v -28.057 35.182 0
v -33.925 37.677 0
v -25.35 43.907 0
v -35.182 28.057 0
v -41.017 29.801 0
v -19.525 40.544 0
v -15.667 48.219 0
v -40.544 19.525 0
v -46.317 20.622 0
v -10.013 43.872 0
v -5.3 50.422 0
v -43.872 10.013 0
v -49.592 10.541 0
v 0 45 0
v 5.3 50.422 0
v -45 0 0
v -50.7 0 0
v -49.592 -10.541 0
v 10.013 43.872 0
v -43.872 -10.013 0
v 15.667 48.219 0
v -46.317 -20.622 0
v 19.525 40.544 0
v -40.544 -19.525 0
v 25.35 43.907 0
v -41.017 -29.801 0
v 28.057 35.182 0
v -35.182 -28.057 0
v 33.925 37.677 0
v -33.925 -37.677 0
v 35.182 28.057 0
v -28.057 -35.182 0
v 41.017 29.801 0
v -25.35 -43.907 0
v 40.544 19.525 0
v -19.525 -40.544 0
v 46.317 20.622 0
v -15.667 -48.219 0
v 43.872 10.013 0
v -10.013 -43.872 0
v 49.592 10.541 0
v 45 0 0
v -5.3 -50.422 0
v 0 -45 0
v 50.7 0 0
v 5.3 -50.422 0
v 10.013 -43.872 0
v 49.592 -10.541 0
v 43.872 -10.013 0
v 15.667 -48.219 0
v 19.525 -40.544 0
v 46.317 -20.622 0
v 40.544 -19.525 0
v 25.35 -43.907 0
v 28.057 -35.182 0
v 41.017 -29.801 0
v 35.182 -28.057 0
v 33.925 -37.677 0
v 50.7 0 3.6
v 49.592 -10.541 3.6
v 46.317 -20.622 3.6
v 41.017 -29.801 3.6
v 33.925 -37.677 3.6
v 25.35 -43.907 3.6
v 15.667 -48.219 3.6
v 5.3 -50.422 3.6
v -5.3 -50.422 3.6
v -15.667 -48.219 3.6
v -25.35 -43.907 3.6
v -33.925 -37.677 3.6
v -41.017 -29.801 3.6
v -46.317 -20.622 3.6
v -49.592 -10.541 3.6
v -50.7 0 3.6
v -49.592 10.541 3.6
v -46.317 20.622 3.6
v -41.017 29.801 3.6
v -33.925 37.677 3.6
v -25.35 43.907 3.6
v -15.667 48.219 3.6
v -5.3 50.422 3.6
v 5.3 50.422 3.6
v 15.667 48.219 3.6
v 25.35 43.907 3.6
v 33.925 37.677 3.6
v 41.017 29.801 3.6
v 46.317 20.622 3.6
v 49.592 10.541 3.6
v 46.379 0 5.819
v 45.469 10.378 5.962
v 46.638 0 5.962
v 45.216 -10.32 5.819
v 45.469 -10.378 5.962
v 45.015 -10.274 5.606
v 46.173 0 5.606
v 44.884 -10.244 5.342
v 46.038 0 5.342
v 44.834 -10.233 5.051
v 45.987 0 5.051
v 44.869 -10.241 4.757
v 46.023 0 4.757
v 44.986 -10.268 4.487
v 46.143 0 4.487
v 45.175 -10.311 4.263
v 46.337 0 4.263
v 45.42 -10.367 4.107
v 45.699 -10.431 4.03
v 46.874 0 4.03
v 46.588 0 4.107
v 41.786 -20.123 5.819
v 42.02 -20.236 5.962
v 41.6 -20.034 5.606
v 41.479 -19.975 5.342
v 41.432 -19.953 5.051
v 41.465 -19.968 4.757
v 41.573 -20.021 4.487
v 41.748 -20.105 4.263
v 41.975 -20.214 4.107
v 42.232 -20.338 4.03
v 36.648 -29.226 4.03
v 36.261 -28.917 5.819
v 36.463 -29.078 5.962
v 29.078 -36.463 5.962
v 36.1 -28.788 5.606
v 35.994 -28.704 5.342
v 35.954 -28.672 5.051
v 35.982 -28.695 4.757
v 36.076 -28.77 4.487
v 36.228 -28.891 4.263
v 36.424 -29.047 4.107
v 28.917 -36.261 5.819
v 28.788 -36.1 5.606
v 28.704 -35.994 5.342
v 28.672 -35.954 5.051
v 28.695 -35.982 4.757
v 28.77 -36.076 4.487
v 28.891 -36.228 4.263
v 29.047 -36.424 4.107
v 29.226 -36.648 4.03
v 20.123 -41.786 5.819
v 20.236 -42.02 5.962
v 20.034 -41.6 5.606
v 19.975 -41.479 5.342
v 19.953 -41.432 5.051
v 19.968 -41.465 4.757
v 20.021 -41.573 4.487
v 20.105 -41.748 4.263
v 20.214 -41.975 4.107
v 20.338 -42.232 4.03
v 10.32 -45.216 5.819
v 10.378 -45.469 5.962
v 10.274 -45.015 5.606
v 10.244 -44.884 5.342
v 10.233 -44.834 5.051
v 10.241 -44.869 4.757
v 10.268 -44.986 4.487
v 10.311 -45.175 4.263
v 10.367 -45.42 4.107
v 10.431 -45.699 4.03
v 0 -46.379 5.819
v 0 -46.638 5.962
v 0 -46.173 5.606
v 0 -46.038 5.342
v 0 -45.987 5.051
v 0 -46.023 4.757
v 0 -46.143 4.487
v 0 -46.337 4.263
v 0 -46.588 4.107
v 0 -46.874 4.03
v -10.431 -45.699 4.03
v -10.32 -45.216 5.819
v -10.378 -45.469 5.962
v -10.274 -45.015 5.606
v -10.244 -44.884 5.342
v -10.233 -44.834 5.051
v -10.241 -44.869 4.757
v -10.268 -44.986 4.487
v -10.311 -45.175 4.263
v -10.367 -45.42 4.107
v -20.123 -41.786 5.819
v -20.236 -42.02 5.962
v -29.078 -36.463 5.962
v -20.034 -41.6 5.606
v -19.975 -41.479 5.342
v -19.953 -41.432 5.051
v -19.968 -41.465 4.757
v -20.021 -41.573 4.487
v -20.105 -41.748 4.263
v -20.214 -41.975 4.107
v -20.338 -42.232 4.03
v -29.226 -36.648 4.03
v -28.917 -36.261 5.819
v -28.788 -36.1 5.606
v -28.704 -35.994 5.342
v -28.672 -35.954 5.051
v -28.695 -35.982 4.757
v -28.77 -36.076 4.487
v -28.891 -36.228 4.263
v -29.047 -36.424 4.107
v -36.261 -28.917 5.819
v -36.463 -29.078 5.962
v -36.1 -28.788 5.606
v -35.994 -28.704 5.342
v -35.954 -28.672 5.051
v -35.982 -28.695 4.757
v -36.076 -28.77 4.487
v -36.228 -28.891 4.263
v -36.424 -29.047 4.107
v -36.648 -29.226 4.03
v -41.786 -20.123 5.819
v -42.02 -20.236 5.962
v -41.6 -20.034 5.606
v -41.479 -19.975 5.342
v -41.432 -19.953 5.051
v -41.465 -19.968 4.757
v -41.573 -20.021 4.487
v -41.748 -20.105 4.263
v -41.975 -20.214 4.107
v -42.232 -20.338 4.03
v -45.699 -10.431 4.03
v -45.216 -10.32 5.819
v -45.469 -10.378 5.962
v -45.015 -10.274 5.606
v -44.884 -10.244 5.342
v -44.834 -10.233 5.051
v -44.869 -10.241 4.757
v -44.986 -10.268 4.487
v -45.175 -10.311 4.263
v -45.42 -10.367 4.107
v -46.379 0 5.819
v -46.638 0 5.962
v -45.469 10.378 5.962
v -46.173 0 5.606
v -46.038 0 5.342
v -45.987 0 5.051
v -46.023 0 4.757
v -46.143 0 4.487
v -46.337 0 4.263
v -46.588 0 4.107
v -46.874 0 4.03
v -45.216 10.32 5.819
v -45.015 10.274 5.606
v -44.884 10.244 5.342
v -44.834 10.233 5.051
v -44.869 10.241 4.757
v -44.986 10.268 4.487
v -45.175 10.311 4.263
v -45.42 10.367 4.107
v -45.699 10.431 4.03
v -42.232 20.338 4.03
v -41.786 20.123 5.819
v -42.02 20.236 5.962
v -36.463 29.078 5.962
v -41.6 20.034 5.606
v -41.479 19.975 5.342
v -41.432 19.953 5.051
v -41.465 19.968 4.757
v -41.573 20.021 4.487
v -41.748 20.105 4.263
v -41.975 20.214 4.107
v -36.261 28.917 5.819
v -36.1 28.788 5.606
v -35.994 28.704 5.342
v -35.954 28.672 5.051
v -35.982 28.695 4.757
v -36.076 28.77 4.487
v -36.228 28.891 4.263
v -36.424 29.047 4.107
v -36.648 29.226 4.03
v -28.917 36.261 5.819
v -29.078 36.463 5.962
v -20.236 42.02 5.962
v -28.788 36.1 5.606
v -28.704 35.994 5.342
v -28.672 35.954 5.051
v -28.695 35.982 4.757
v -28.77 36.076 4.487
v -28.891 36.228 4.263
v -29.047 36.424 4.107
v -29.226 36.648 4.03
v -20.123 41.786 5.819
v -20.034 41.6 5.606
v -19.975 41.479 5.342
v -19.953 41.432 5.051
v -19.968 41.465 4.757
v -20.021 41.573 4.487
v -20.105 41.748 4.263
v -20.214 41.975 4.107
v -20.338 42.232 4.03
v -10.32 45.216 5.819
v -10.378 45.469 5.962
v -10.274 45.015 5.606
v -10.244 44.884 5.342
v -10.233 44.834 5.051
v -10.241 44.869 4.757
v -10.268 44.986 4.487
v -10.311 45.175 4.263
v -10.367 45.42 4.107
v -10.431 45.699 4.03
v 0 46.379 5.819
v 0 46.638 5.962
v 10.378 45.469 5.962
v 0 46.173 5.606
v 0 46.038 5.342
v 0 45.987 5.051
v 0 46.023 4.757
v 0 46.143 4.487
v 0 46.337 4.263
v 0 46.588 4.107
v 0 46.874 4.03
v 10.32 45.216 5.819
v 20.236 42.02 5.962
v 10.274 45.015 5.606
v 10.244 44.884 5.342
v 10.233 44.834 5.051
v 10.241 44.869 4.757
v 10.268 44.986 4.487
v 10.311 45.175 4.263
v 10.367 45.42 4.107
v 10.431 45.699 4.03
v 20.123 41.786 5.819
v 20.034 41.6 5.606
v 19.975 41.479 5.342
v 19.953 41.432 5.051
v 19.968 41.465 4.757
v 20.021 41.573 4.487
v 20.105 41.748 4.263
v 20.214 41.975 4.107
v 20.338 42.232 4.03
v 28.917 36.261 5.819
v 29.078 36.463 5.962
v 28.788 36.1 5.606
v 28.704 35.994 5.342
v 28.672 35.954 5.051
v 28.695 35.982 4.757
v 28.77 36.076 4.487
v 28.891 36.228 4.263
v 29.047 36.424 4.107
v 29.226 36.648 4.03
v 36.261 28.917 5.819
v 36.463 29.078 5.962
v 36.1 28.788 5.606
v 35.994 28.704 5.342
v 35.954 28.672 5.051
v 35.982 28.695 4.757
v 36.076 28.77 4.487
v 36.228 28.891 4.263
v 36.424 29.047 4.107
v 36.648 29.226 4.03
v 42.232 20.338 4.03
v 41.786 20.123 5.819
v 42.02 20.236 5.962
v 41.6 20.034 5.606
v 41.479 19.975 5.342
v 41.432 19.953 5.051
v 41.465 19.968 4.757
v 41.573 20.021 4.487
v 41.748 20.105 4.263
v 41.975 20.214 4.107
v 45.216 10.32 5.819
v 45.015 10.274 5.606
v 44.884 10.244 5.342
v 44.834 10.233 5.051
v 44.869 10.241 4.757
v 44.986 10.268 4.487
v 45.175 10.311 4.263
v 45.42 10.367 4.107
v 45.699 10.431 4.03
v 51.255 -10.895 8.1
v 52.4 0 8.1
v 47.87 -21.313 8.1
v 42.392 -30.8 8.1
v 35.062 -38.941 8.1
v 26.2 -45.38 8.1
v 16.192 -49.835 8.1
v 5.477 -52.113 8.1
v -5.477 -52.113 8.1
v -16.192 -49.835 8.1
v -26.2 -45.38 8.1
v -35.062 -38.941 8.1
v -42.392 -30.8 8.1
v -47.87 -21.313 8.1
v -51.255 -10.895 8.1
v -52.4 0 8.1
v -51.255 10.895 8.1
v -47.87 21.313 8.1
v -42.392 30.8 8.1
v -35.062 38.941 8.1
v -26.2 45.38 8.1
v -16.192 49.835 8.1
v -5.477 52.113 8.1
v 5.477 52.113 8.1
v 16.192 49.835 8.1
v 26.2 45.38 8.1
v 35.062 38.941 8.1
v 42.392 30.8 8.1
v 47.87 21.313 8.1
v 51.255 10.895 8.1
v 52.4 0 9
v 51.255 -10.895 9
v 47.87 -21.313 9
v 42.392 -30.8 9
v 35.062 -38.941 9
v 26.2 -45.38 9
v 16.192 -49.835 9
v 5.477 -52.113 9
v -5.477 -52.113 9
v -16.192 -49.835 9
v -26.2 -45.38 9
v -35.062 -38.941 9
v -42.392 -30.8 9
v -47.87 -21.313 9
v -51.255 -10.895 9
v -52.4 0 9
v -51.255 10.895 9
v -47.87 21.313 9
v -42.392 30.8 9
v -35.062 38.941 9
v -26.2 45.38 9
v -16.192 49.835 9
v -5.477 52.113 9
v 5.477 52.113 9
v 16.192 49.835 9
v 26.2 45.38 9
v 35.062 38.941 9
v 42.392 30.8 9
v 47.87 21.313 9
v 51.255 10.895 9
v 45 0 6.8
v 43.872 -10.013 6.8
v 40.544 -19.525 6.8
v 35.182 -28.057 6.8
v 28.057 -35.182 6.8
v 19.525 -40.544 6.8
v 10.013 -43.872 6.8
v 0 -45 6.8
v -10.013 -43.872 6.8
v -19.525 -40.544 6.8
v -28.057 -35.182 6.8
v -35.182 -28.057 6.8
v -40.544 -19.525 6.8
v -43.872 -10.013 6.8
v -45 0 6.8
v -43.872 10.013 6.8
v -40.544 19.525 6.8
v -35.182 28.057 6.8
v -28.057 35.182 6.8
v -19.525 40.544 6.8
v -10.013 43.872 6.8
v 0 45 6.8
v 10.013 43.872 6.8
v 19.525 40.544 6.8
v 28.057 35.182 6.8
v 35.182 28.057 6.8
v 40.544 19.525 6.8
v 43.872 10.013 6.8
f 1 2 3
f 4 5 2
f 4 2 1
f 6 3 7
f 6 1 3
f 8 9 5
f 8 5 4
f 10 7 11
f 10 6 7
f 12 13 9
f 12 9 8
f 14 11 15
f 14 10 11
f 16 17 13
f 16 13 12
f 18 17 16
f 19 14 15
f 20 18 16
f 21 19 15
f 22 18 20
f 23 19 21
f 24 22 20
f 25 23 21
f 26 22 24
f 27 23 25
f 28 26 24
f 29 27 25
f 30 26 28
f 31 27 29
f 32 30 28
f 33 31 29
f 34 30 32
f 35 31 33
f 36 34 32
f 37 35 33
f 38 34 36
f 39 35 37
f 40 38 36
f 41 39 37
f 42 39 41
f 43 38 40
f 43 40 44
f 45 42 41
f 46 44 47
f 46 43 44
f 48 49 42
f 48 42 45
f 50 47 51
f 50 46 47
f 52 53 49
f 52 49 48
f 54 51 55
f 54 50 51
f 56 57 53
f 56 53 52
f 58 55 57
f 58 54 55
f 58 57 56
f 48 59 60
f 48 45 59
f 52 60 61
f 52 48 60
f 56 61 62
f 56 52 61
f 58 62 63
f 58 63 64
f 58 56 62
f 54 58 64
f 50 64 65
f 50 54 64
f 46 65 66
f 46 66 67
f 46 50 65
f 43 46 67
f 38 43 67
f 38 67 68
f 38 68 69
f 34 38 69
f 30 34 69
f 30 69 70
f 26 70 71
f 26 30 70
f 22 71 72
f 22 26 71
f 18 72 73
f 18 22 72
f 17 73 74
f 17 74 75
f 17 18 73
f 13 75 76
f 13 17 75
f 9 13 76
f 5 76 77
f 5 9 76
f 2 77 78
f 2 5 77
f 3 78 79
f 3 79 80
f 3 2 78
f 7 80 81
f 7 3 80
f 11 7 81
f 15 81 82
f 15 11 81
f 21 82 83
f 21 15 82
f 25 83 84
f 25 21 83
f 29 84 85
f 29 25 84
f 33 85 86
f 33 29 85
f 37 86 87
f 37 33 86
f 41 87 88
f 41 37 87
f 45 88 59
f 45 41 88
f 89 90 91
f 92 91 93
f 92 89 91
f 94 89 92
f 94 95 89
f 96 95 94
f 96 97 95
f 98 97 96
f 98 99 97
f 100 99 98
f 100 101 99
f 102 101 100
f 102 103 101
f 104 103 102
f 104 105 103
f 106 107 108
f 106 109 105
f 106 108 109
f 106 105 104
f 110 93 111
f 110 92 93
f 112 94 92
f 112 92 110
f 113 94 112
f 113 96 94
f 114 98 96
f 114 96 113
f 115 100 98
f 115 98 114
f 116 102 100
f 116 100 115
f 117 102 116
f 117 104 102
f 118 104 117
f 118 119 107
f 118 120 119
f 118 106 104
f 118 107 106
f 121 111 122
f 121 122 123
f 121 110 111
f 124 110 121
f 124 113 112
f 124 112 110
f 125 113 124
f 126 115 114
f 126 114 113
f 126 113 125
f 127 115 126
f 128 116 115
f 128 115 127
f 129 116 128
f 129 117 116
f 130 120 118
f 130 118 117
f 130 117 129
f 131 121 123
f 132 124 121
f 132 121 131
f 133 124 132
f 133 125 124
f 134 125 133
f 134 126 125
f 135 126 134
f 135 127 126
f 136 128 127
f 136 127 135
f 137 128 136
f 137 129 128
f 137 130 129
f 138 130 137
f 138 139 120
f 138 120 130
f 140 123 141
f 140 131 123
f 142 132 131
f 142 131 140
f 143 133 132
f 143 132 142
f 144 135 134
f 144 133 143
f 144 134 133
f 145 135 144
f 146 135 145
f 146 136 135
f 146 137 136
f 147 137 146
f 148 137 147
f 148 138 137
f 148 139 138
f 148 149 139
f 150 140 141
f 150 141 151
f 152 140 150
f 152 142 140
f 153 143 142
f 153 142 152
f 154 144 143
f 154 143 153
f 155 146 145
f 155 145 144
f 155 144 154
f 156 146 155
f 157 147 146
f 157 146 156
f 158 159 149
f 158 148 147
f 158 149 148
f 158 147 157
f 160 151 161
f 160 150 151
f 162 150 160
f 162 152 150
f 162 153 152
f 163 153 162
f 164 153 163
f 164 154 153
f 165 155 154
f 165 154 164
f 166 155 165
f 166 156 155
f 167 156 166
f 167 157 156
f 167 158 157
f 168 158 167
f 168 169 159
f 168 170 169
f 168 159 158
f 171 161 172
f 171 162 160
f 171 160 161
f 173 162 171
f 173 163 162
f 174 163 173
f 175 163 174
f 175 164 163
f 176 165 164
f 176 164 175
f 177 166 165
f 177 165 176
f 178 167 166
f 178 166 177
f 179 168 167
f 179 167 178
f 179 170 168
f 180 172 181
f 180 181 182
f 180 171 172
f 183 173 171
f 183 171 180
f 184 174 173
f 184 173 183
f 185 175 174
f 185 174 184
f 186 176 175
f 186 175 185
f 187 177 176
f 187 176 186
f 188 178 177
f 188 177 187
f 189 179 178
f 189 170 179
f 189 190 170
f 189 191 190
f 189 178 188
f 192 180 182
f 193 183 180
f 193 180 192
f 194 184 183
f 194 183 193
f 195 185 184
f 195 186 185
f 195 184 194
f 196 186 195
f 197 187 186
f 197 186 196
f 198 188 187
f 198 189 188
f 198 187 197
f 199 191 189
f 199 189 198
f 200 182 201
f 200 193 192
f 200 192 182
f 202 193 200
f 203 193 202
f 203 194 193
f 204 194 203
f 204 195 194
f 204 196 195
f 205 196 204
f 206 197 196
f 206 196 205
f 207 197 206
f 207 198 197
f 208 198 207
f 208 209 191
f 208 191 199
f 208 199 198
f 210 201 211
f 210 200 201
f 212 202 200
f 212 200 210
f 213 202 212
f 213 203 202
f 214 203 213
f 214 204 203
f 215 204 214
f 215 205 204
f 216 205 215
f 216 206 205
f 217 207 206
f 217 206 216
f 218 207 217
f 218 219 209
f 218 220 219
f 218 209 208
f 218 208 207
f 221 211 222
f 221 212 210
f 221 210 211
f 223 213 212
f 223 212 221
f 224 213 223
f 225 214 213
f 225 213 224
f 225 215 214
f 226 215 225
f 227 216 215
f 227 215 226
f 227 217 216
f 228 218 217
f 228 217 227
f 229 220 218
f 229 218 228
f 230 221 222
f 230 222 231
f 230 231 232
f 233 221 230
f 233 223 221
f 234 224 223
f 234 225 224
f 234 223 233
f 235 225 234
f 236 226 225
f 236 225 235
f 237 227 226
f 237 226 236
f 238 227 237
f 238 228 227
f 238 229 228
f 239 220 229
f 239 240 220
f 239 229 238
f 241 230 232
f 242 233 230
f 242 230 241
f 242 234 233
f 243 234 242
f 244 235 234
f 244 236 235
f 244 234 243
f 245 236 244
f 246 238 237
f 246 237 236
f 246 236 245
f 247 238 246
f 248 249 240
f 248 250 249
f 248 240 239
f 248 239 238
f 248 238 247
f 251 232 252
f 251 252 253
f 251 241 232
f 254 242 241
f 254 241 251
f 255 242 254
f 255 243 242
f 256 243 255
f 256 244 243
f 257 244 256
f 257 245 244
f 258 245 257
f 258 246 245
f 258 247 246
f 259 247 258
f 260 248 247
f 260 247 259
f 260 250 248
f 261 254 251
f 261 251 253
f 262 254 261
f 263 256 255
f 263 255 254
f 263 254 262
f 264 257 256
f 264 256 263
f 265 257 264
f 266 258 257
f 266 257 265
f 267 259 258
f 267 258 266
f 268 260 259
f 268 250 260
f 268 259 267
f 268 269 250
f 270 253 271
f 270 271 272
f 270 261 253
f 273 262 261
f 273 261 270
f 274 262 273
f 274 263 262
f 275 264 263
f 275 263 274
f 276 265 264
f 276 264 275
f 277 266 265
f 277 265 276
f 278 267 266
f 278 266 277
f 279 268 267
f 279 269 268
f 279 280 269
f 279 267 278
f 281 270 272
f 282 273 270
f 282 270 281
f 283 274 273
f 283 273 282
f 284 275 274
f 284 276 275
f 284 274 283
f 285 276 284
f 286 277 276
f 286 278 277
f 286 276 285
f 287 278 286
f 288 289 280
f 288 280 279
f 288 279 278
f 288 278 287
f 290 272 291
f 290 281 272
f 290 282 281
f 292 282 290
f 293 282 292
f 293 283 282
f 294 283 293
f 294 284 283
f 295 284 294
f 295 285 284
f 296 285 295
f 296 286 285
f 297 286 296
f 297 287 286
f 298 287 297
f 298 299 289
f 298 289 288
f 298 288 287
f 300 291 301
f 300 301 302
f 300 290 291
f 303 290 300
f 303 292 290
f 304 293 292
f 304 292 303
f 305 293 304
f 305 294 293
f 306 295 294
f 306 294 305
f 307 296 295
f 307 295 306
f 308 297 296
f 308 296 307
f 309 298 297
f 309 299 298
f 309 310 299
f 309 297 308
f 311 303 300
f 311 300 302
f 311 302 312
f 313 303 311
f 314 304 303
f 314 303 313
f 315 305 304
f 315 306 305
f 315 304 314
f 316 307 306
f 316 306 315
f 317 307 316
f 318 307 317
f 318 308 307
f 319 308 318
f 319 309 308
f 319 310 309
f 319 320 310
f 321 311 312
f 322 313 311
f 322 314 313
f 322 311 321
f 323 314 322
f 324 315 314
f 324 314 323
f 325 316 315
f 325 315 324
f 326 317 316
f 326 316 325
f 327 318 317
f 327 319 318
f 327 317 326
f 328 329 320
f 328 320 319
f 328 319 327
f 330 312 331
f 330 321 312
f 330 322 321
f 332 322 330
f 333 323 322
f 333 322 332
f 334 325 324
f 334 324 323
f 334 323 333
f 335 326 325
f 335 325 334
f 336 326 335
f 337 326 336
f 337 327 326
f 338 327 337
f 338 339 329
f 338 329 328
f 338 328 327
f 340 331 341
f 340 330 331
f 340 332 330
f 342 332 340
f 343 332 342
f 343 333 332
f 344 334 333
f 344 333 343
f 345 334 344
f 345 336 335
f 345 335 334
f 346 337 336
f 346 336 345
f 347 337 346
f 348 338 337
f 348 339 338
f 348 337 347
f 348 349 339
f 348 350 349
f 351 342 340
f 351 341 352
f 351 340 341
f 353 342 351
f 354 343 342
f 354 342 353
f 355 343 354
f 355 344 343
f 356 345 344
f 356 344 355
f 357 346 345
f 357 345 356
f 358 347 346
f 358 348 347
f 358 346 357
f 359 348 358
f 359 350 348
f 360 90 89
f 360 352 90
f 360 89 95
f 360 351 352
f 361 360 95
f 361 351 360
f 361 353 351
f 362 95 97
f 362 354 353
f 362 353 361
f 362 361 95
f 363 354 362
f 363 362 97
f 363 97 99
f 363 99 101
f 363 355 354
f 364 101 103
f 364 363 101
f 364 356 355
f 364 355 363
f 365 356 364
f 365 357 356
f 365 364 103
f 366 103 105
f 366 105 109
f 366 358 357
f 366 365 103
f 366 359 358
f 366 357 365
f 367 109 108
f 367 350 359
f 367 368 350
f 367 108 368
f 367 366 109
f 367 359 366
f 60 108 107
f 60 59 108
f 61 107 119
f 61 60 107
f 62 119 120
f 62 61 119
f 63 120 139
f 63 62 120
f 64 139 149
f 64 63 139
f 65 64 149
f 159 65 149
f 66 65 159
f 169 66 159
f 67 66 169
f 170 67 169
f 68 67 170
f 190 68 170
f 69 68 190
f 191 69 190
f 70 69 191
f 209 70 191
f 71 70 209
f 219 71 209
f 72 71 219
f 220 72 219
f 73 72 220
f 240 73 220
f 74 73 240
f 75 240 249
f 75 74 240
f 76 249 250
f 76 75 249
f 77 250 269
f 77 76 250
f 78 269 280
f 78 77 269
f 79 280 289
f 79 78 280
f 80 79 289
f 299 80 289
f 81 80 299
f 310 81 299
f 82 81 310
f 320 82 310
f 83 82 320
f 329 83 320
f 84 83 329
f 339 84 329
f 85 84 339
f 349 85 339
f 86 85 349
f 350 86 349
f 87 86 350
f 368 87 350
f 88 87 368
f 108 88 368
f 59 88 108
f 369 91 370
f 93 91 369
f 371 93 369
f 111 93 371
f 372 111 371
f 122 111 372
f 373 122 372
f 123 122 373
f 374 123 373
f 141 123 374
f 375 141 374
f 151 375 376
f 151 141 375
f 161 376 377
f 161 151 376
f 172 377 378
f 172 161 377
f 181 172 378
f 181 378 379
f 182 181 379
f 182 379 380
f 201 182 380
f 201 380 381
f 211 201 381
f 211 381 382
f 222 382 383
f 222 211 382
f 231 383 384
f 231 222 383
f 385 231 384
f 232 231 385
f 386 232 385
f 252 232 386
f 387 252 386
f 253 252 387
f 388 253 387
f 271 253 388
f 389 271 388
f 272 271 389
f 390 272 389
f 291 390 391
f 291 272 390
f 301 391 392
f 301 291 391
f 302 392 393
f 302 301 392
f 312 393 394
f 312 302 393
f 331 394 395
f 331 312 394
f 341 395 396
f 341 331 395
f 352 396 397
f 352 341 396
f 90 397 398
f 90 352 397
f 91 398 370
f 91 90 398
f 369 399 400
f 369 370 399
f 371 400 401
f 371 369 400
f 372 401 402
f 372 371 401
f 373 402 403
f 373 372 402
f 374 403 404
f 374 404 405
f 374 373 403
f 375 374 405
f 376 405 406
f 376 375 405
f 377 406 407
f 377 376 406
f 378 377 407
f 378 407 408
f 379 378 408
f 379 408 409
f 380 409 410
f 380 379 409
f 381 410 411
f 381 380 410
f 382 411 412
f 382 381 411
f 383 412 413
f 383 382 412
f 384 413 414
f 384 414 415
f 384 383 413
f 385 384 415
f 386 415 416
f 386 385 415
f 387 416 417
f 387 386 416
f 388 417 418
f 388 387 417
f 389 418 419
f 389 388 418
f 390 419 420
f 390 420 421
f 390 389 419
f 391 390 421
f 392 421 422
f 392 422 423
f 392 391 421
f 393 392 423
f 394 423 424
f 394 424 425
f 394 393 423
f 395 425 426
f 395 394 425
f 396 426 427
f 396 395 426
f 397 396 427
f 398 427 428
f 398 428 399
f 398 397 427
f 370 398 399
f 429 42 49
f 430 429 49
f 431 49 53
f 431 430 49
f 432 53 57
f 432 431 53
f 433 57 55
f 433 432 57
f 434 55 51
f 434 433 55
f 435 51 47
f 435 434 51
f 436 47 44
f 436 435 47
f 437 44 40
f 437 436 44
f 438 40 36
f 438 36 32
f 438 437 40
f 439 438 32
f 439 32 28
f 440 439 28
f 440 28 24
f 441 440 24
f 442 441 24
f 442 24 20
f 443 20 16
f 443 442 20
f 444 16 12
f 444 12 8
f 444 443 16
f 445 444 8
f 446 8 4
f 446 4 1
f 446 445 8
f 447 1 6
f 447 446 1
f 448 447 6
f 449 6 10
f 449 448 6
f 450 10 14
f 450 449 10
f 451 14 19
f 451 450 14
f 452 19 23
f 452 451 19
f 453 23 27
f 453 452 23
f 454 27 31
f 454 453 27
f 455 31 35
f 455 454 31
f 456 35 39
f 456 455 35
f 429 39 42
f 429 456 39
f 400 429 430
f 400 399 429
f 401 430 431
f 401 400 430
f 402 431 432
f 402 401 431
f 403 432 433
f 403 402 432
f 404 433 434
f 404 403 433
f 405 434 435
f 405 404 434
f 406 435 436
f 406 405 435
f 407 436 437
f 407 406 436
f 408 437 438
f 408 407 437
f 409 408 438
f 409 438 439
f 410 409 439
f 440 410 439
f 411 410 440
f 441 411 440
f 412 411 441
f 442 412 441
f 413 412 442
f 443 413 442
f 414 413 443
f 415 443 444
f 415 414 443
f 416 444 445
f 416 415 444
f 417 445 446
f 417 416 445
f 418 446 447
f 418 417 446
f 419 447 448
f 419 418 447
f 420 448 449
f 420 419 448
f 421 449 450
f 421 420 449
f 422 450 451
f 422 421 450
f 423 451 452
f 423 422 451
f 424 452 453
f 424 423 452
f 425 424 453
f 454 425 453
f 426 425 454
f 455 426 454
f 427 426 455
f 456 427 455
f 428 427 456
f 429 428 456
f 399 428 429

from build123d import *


with BuildPart() as part:
    # Sketch1 → Revolve1 (revolve)
    with BuildSketch(Plane(origin=(0, 0, 0), x_dir=(0, 0, -1), z_dir=(1, 0, 0)), mode=Mode.PRIVATE) as revolve1_sk:
        with BuildLine():
            Line((-9, 52.4), (-8.1, 52.4))
            Line((-8.1, 52.4), (-5.961624878, 46.638267033))
            ThreePointArc((-5.961624878, 46.638267033), (-4.902735476, 45.99360404), (-4.030378188, 46.87441611))
            Line((-4.030378188, 46.87441611), (-3.6, 50.7))
            Line((-3.6, 50.7), (0, 50.7))
            Line((0, 50.7), (0, 45))
            Line((0, 45), (-6.8, 45))
            Line((-6.8, 45), (-9, 52.4))
        make_face()
    revolve(revolve1_sk.sketch.rotate(Axis((0, 0, 0), (0, 0, -1)), 90), axis=Axis((0, 0, 0), (0, 0, -1)))


solid = part.part
